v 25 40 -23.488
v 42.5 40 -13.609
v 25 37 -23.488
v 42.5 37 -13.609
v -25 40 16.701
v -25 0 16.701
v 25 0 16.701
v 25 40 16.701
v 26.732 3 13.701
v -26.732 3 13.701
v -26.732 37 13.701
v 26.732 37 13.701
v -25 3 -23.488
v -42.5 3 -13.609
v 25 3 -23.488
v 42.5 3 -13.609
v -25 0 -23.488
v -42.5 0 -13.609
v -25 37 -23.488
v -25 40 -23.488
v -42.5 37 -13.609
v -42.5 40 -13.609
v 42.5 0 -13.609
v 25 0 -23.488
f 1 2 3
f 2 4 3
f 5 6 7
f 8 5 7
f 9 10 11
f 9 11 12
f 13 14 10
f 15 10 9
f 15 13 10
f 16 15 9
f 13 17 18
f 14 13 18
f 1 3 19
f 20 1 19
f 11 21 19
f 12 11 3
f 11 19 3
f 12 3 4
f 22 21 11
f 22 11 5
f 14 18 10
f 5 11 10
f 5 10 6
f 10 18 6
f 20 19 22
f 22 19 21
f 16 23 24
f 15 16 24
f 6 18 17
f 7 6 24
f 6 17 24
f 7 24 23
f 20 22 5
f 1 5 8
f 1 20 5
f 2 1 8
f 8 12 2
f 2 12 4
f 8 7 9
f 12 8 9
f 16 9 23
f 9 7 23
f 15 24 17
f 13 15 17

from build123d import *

# Parameters (mm, degrees)
EXTRUDE_1_DEPTH = 40
SHELL_1_T       = -3


with BuildPart() as part:
    # 草图1 → 凸台-拉伸1 (new body)
    with BuildSketch(Plane(origin=(0, 0, 0), x_dir=(1, 0, 0), z_dir=(0, 1, 0))):
        Polygon((-25, -16.701458194), (25, -16.701458194), (42.5, 13.609430939), (25, 23.487817083), (-25, 23.487817083), (-42.5, 13.609430939), align=None)
    extrude(amount=EXTRUDE_1_DEPTH)

    # 抽壳1
    shell_1_openings = [part.faces().sort_by_distance(p)[0] for p in [
        (-33.75, 20, -18.548624011),
        (0, 20, -23.487817083),
        (33.75, 20, -18.548624011),
        (33.75, 20, 1.546013628),
        (-33.75, 20, 1.546013628),
    ]]
    offset(amount=SHELL_1_T, openings=shell_1_openings, kind=Kind.INTERSECTION)


solid = part.part
